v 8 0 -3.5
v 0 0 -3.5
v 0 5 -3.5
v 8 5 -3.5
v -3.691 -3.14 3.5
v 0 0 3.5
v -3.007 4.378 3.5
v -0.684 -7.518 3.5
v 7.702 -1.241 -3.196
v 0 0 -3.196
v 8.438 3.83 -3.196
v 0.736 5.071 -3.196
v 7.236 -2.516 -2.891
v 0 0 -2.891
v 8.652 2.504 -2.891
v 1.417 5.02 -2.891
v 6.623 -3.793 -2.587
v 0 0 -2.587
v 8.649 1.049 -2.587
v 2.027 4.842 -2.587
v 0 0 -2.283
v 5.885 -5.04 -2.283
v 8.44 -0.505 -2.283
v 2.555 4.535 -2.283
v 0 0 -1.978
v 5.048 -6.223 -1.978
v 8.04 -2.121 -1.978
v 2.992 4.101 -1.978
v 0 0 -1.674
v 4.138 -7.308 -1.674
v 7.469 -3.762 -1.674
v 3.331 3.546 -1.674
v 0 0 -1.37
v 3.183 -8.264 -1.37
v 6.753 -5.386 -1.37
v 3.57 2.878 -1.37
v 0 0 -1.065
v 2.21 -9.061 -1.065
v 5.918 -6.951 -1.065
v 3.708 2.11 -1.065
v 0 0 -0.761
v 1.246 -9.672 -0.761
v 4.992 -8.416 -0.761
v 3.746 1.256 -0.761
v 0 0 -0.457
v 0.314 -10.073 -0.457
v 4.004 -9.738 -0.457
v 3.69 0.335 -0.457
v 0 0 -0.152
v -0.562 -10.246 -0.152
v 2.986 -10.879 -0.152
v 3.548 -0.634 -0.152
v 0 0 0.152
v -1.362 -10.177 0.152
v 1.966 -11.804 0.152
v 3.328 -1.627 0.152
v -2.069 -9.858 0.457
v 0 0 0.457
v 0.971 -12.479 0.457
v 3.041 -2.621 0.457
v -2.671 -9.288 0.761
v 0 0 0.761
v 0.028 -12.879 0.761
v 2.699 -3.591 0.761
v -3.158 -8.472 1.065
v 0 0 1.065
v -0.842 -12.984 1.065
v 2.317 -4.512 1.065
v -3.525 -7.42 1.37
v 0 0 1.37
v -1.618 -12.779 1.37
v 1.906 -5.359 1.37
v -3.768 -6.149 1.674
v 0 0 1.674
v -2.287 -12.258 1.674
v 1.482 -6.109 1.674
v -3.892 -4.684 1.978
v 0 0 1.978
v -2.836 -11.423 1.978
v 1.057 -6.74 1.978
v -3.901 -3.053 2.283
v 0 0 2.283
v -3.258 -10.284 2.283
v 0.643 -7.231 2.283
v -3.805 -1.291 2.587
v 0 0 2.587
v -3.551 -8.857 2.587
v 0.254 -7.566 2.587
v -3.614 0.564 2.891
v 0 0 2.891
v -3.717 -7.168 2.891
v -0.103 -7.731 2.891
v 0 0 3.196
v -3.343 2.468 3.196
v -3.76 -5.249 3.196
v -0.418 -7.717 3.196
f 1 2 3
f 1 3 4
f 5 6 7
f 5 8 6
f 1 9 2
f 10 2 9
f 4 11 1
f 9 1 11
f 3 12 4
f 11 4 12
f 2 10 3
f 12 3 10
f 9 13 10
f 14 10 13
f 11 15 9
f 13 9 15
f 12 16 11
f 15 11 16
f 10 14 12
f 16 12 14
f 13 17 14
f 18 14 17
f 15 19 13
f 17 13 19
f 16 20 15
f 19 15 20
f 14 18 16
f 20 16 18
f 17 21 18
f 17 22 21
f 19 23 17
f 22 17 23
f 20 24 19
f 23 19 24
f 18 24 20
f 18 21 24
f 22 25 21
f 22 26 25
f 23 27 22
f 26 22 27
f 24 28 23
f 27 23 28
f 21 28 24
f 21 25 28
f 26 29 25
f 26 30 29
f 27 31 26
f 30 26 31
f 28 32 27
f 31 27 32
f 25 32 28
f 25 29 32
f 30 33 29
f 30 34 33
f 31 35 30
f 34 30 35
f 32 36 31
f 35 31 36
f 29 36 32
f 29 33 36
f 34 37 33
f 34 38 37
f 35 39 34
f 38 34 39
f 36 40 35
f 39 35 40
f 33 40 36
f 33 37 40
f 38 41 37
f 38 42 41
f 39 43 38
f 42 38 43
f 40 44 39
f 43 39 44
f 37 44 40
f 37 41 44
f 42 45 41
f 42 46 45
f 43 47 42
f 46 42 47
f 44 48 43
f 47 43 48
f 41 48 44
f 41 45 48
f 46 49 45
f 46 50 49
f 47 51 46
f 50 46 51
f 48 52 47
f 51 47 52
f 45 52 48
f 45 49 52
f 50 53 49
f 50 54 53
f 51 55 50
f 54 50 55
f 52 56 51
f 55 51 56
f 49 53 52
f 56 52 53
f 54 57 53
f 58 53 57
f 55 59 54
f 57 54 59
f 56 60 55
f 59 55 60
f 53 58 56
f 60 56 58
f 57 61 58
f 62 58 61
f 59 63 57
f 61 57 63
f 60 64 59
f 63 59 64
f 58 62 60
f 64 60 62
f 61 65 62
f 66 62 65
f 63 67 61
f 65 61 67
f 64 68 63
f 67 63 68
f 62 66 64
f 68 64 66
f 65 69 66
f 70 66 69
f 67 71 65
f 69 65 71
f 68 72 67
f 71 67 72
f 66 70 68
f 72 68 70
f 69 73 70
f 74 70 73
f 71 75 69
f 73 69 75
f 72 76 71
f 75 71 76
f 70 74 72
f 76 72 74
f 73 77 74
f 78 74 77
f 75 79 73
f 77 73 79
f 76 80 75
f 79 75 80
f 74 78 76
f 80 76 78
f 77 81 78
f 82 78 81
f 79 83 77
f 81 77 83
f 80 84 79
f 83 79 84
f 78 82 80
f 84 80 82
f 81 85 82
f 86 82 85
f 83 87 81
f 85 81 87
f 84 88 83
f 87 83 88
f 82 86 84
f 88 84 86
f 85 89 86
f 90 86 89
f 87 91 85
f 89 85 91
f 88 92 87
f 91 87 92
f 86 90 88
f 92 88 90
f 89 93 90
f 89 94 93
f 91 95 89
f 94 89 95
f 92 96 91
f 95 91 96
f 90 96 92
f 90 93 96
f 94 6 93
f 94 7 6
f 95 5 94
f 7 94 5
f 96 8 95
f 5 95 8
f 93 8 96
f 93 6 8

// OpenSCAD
// Twist combined with a non-uniform scale (A-G11). Each edge is refined by the
// peak stretch its direction reaches over the swept slices — not the twist-only
// length, which read 0.8% high in volume and split the segment budget the wrong
// way between edges. Oracle: OpenSCAD 2021.01+ reports volume 246.444, 1244 tris.
// oracle: tris
$fa=8;$fs=1.5;
linear_extrude(height=7,twist=200,scale=[0.4,1.6],center=true) square([8,5]);
